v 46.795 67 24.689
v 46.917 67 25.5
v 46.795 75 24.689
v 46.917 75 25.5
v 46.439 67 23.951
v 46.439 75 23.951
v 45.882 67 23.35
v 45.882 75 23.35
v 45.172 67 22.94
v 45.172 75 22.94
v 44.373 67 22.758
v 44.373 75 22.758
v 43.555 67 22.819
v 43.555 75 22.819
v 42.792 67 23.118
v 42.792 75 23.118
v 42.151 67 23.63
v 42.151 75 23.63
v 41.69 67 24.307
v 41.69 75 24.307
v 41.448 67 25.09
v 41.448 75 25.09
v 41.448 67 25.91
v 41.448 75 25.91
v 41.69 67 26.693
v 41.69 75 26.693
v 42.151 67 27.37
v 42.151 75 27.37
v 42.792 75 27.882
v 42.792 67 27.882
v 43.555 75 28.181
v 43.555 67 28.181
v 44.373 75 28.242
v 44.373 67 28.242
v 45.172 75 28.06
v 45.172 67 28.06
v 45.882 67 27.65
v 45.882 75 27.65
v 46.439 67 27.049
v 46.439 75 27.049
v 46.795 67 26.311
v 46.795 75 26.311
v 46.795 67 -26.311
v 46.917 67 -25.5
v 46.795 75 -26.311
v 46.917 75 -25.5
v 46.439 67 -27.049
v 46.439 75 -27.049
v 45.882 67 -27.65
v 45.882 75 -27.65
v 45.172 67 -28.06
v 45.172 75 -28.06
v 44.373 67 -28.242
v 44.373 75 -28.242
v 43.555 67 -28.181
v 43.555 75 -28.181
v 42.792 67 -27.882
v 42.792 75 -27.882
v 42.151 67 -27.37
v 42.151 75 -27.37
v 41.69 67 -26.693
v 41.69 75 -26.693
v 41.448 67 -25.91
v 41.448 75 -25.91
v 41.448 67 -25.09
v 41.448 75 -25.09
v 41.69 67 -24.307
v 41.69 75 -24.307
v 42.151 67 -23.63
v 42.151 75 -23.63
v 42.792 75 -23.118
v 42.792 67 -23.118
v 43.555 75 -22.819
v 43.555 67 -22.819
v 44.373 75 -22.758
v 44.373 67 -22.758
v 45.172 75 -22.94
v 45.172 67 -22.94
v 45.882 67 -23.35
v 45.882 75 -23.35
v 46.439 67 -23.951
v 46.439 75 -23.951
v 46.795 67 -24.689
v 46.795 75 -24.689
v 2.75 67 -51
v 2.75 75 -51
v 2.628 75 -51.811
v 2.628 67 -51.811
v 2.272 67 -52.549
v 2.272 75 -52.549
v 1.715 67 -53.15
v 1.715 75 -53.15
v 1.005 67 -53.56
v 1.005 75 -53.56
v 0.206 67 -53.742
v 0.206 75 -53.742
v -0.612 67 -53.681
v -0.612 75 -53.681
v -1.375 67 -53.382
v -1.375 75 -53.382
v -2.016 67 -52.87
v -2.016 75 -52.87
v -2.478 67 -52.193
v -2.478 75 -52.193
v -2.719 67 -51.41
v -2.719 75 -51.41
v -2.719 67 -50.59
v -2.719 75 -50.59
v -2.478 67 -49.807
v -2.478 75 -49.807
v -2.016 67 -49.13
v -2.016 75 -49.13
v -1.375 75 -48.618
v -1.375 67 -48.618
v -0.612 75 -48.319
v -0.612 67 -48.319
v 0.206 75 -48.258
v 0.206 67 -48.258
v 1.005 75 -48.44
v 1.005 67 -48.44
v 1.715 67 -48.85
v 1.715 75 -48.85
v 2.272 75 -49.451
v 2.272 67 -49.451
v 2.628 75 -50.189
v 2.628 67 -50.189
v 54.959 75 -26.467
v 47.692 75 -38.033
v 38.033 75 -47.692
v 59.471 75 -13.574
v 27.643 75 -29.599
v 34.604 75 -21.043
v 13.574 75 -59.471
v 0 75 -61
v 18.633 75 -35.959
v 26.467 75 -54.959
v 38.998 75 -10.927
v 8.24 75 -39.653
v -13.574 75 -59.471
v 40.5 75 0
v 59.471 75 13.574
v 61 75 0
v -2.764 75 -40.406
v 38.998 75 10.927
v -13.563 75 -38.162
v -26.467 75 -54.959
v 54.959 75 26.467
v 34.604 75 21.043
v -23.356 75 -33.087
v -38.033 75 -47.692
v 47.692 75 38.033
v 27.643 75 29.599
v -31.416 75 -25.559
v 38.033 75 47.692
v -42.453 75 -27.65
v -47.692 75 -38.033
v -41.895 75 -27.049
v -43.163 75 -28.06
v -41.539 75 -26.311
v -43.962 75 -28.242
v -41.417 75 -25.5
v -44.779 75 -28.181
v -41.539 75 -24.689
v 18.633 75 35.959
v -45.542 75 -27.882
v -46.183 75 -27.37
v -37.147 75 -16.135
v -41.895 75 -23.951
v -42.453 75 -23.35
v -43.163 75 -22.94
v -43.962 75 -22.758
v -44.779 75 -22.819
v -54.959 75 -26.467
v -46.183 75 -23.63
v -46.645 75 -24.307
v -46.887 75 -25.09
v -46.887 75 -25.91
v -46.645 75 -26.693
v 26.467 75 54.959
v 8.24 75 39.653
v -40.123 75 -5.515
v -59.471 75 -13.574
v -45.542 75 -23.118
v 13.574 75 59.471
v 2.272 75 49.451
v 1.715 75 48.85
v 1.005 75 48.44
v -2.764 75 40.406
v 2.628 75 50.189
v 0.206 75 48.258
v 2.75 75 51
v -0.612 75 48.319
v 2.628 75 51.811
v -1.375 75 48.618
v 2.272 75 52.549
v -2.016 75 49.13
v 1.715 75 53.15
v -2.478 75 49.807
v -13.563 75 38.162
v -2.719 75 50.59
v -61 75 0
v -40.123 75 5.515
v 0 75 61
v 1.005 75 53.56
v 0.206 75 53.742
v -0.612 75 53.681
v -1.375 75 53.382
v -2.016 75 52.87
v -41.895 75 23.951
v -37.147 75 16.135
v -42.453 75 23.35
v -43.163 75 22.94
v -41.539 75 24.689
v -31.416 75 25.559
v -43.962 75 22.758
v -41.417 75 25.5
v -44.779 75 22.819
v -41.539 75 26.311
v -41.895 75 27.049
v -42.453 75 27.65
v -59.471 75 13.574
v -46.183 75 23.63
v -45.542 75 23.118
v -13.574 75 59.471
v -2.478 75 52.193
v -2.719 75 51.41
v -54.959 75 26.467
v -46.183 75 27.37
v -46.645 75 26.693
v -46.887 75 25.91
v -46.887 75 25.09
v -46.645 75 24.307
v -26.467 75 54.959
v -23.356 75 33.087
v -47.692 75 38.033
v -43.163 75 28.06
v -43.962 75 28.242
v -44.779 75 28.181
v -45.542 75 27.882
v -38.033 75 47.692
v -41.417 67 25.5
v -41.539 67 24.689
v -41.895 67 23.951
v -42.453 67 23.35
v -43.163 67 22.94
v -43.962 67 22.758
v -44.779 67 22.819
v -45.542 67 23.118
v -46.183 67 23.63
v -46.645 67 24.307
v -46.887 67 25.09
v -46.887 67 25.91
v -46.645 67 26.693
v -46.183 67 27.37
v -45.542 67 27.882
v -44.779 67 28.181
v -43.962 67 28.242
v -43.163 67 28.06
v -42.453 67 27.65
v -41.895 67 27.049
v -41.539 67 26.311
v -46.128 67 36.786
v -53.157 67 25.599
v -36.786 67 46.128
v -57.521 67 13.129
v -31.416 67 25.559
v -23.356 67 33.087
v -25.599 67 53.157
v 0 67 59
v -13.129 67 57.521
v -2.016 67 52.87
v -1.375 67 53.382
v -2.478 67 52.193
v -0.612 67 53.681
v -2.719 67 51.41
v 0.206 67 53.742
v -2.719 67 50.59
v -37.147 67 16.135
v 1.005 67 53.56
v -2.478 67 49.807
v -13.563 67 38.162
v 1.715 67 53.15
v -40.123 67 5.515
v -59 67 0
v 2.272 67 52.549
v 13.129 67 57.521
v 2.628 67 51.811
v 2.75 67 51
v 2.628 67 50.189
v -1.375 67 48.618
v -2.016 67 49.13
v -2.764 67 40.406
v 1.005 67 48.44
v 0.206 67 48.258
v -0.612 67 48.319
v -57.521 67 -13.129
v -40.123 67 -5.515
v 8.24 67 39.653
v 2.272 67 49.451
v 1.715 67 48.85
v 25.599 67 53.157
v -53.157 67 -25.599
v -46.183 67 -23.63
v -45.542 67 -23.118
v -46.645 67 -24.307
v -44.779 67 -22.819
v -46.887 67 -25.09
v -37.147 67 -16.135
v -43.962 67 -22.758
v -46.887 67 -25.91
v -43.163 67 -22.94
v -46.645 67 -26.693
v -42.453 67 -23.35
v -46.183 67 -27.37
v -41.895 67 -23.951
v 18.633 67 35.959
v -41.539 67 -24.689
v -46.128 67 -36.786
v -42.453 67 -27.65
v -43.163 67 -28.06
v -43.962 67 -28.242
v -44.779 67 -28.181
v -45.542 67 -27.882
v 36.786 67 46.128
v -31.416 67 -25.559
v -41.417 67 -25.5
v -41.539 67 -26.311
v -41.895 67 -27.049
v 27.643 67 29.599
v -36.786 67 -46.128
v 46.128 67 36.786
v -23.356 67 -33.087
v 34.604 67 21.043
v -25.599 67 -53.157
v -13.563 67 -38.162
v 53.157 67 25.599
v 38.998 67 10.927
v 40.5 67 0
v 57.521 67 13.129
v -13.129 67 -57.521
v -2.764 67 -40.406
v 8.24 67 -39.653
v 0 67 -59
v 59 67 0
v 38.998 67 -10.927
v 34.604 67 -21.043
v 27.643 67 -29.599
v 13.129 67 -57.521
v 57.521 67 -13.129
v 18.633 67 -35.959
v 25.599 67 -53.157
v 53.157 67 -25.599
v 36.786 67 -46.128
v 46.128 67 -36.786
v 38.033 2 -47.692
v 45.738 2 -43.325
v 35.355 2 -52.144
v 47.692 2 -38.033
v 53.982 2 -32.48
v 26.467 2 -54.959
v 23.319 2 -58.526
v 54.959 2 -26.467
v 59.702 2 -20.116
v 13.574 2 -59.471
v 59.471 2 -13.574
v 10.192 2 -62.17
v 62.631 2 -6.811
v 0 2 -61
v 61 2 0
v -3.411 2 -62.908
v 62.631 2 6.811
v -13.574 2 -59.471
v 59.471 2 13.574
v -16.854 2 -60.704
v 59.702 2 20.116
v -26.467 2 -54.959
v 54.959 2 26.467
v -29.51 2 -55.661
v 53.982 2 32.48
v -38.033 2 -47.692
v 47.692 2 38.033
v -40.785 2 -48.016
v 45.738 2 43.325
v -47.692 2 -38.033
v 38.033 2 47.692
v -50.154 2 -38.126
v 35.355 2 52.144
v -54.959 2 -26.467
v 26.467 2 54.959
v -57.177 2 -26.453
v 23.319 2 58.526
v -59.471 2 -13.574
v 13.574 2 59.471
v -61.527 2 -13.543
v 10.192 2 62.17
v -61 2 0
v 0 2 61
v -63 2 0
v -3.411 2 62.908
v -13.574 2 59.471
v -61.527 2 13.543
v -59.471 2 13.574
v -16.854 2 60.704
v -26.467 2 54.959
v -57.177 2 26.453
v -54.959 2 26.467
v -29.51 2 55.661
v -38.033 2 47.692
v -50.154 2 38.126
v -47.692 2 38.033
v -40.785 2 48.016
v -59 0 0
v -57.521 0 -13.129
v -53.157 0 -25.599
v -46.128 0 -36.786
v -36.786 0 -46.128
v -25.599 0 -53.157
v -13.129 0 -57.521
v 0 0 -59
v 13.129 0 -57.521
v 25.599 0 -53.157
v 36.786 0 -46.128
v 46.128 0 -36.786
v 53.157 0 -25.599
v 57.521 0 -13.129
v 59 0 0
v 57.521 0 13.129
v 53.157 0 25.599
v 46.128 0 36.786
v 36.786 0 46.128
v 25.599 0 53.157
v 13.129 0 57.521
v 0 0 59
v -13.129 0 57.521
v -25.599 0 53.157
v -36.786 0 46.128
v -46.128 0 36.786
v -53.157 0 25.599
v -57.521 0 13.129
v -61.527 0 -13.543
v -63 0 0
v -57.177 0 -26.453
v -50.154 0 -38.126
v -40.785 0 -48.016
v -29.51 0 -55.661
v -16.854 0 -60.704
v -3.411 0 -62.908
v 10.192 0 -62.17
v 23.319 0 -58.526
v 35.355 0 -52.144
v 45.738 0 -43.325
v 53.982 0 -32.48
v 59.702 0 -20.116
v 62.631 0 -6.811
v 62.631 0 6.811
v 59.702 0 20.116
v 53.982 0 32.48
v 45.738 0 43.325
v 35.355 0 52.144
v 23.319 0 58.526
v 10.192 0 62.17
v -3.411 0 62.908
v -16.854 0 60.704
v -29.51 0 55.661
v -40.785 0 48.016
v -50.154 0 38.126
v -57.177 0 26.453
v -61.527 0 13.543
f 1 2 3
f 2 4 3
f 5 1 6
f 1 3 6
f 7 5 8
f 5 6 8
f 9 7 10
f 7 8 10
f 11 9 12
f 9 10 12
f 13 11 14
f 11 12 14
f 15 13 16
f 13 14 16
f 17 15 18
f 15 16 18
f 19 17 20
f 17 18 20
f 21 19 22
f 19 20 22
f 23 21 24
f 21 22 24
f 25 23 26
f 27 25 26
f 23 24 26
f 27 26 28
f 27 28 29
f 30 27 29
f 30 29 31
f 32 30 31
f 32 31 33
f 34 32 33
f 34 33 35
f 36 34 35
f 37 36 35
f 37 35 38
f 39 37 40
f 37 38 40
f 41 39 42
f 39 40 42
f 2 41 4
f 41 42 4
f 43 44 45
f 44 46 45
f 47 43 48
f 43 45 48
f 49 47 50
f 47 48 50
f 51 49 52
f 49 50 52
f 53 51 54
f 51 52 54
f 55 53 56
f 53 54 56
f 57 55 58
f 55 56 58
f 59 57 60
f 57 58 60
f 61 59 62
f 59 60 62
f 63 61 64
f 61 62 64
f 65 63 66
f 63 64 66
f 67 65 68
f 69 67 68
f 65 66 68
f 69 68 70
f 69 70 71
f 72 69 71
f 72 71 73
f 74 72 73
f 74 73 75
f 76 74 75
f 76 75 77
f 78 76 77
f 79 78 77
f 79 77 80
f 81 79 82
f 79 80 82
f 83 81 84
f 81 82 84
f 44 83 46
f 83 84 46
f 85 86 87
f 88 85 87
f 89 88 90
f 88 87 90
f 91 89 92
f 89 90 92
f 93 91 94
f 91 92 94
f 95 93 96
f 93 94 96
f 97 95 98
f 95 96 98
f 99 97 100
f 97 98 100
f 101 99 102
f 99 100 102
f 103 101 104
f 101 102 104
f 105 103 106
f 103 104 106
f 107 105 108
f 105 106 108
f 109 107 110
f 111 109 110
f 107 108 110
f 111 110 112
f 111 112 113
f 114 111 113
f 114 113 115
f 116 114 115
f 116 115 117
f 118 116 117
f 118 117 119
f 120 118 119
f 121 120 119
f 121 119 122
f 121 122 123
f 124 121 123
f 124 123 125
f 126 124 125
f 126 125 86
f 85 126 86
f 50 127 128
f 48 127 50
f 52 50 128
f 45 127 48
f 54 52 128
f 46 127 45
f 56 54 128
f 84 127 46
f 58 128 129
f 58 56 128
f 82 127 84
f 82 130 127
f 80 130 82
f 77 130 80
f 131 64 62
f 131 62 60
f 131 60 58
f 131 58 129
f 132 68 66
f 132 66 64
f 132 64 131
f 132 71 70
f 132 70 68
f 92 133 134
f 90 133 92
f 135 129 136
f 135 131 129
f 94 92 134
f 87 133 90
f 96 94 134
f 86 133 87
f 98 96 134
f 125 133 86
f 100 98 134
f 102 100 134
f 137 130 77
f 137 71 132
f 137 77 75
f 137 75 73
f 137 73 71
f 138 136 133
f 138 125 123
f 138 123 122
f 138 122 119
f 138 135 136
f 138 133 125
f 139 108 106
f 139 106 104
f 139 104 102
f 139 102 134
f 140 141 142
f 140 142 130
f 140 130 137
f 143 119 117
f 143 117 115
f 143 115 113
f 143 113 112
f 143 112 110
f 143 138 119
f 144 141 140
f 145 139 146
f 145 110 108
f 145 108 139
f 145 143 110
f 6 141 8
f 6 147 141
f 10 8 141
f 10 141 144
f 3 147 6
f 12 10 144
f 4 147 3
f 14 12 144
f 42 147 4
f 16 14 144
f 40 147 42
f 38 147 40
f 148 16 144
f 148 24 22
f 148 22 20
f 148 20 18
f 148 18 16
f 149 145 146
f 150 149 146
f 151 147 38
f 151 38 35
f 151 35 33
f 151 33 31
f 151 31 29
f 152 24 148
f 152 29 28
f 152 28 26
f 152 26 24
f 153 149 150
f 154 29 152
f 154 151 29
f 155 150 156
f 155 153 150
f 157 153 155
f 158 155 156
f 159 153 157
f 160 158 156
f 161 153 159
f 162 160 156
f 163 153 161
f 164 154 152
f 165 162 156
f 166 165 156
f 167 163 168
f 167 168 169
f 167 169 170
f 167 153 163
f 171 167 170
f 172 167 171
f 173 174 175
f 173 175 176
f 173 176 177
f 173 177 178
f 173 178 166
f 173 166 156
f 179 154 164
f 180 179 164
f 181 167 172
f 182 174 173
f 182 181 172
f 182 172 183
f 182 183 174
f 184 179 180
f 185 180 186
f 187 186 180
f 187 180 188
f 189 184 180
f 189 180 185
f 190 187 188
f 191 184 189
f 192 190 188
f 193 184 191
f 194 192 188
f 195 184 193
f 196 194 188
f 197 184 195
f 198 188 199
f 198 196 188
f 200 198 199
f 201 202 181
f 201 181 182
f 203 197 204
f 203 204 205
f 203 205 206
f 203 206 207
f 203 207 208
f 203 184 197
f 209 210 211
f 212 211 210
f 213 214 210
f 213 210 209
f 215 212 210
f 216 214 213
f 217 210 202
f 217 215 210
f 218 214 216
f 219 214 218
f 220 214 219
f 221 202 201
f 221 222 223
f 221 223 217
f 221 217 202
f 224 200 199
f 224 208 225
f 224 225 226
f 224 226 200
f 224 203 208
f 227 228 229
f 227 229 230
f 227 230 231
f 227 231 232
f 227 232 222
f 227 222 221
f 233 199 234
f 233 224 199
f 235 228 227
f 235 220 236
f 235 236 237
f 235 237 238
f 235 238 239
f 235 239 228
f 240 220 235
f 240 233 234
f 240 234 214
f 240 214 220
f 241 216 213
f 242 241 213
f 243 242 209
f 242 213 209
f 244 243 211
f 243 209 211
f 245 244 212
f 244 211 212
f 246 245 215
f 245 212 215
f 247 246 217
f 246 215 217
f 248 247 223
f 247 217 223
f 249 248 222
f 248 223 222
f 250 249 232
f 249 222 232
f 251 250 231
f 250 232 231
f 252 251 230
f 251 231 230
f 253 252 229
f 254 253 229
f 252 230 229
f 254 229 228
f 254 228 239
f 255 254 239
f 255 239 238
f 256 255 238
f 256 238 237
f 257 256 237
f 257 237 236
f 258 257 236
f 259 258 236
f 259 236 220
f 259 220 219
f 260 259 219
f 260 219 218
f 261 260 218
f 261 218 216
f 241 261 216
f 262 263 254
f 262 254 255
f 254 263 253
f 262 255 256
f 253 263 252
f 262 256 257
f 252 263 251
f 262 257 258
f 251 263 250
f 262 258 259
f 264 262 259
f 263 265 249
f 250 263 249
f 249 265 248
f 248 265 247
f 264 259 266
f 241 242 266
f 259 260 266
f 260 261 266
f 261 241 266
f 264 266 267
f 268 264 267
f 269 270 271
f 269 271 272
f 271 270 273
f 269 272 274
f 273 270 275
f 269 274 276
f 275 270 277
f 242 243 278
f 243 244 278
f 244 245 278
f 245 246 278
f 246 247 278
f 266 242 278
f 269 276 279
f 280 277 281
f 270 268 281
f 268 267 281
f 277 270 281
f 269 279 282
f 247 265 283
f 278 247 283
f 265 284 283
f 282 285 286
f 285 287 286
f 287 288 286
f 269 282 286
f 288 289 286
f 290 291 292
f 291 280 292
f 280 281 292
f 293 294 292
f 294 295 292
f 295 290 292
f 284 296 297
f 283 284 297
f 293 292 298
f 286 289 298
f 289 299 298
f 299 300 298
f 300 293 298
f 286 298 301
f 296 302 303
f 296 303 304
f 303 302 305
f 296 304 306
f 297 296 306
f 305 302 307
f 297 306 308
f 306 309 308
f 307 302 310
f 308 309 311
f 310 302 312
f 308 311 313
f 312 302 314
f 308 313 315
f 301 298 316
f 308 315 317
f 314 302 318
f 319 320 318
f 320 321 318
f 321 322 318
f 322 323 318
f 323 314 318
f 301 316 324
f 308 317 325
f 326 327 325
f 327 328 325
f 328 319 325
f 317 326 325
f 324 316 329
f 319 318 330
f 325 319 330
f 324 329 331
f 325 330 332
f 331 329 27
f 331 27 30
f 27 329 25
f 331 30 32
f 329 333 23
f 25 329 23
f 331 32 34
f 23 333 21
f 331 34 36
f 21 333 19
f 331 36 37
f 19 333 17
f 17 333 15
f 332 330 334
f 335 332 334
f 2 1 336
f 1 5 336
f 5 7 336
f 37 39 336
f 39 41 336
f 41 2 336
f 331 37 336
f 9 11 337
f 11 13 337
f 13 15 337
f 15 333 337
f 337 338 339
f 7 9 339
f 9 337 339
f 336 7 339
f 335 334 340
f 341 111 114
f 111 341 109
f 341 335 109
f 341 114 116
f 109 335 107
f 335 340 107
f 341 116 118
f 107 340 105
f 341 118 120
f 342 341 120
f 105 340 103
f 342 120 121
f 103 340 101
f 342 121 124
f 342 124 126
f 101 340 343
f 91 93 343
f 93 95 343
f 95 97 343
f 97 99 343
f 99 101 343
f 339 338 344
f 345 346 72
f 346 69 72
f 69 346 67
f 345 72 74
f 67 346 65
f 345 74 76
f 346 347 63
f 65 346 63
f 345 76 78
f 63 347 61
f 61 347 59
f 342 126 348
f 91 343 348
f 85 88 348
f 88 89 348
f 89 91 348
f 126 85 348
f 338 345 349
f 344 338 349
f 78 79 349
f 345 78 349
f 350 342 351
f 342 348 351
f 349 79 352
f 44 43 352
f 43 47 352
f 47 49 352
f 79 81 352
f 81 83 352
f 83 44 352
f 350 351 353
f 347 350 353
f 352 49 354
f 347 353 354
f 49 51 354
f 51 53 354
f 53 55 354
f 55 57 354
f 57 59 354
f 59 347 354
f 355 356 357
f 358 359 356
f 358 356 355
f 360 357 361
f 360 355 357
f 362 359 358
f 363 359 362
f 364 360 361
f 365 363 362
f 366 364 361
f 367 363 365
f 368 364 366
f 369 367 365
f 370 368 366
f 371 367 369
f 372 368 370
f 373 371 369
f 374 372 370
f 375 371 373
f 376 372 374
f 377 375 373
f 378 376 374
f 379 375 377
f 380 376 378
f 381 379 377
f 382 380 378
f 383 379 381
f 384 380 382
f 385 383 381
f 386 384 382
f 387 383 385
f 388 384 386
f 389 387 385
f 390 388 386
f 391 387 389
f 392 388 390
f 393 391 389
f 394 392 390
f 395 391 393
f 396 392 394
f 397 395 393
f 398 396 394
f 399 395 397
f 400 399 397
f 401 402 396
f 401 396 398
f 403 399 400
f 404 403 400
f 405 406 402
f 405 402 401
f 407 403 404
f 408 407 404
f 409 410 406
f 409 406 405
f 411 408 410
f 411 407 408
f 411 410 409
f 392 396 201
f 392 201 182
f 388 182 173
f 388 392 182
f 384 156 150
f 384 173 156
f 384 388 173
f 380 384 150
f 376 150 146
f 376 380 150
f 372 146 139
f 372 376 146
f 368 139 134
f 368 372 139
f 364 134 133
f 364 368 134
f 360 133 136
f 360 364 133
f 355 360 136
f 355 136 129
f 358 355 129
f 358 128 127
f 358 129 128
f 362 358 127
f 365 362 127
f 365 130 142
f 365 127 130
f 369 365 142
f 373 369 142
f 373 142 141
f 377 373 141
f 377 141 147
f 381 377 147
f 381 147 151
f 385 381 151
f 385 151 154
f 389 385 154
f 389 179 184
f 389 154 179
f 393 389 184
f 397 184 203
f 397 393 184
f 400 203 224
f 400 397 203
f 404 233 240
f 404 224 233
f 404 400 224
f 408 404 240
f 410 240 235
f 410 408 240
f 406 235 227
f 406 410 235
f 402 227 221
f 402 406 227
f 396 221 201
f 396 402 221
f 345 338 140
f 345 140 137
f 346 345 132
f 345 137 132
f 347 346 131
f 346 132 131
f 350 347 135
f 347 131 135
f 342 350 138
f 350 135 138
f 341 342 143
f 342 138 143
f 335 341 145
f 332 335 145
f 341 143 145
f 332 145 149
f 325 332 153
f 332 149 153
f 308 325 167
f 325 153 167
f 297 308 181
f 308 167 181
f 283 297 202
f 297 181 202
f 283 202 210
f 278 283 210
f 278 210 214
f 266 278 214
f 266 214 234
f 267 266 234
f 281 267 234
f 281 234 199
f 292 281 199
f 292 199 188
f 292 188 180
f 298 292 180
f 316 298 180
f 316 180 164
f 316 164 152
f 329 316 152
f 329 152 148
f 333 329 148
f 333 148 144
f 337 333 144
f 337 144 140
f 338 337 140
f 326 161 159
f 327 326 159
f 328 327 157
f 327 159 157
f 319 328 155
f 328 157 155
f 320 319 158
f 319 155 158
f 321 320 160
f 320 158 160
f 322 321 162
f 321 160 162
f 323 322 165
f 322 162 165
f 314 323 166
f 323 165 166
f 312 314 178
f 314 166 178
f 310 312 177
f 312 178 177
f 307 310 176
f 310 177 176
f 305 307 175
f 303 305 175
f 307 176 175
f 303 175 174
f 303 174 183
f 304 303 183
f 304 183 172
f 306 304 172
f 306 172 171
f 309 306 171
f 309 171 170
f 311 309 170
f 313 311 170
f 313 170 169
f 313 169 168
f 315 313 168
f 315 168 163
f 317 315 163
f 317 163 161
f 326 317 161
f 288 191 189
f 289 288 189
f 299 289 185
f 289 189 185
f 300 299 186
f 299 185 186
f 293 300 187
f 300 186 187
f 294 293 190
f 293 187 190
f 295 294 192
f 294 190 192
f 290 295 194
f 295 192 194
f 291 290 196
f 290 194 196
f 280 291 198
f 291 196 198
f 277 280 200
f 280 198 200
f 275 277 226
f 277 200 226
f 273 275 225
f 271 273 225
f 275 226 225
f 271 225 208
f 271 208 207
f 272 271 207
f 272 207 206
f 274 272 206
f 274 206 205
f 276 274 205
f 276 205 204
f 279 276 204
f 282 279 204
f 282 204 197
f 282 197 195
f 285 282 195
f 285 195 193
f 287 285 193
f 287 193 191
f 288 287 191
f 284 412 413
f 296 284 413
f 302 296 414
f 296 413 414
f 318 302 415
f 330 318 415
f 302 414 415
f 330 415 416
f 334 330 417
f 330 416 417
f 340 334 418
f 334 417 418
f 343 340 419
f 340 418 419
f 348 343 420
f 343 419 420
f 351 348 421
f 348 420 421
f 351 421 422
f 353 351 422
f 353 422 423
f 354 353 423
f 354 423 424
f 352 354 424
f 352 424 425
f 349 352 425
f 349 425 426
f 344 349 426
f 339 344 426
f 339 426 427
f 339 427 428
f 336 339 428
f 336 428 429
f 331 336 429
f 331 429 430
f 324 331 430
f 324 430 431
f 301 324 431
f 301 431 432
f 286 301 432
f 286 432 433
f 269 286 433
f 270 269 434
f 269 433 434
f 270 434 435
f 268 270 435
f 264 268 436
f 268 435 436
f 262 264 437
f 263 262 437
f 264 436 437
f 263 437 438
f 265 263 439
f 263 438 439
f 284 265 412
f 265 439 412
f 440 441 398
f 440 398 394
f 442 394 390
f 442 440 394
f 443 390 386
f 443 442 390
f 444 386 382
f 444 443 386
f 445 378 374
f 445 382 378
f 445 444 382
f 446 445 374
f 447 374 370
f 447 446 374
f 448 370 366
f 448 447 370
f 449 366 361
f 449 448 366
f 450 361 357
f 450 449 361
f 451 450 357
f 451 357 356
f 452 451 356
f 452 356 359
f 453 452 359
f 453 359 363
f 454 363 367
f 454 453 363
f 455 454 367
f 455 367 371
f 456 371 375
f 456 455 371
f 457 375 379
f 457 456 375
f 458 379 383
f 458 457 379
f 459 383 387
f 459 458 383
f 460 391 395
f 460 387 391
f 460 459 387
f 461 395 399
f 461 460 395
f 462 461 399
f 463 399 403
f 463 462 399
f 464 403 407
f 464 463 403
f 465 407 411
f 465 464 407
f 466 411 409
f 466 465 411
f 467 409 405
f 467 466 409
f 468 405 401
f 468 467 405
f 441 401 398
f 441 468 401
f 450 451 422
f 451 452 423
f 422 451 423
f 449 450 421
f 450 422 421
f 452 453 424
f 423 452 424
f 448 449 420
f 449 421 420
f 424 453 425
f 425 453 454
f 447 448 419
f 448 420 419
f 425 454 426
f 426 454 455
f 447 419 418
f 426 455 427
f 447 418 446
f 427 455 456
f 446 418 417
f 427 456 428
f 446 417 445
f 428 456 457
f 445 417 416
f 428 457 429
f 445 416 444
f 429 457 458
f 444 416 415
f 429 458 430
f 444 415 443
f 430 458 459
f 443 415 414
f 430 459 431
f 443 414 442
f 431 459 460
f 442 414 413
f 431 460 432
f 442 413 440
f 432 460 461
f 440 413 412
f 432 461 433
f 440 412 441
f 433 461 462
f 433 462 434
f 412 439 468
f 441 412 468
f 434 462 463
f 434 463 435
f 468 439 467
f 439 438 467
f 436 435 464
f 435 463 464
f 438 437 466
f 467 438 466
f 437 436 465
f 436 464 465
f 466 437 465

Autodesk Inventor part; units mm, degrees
ref_plane "YZ Plane" through (0, 0, 0) normal (1, 0, 0) x (0, 1, 0)
ref_plane "XZ Plane" through (0, 0, 0) normal (0, 1, 0) x (-1, 0, 0)
sketch "Sketch1" plane through (0, 0, 0) normal (0, 1, 0) x (-1, 0, 0)
  circle A0 centre (0, 0) radius 63
  circle A1 centre (0, 0) radius 61
  circle A2 centre (0, 0) radius 59
  dimension "Absolute_Diameter" = 126
  dimension "Diameter_No_Outer_Lip" = 122
  dimension "Inner_Cylinder_Diameter" = 118
extrude "Extrusion1" add sketch "Sketch1" along normal blind 2 contours A0
extrude "Extrusion2" add sketch "Sketch1" along normal blind 75 contours A1
sketch "Sketch2" plane through (0, 75, 0) normal (0, 1, 0) x (1, 0, 0)
  circle A0 centre (0, 0) radius 40.5
  circle A1 centre (0, 0) radius 61
  dimension "Lip_Diameter_Out" = 81
  dimension "Top_Outer_Lip_Diameter" = 122
extrude "Extrusion7" add sketch "Sketch2" against normal blind 8
ref_plane "Work Plane2" through (0, 10, 0) normal (0, 1, 0) x (1, 0, 0)
sketch "Sketch3" plane through (0, 10, 0) normal (0, 1, 0) x (1, 0, 0)
  circle A0 centre (0, 0) radius 127.5
  circle A1 centre (-127.5, 0) radius 2.5
  circle A2 centre (-103.1497, -74.9426) radius 2.5
  circle A3 centre (-39.3997, -121.2597) radius 2.5
  circle A4 centre (39.3997, -121.2597) radius 2.5
  circle A5 centre (103.1497, -74.9426) radius 2.5
  circle A6 centre (127.5, 0) radius 2.5
  circle A7 centre (103.1497, 74.9426) radius 2.5
  circle A8 centre (39.3997, 121.2597) radius 2.5
  circle A9 centre (-39.3997, 121.2597) radius 2.5
  circle A10 centre (-103.1497, 74.9426) radius 2.5
  dimension "d27" = 255
  dimension "d28" = 5
  dimension "d31" = 360
extrude "Extrusion8" [suppressed]
sketch "Sketch24" plane through (0, 75, 0) normal (0, 1, 0) x (1, 0, 0)
  circle A0 centre (0, 0) radius 51
  circle A1 centre (0, -51) radius 2.75
  circle A2 centre (44.1673, -25.5) radius 2.75
  circle A3 centre (44.1673, 25.5) radius 2.75
  circle A4 centre (0, 51) radius 2.75
  circle A5 centre (-44.1673, 25.5) radius 2.75
  circle A6 centre (-44.1673, -25.5) radius 2.75
  dimension "d230" = 102
  dimension "d231" = 5.5
  dimension "d234" = 360
extrude "Extrusion30" cut sketch "Sketch24" against normal blind 10 contours A3 A0 | A0 A3 | A2 A0 | A0 A2 | A4 A0 | A0 A4 | A1 A0 | A0 A1 | A5 A0 | A0 A5 | A6 A0 | A0 A6
sketch "Sketch48" plane through (0, 75, 0) normal (0, 1, 0) x (1, 0, 0)
  circle A0 centre (0, 0) radius 51
  dimension "Lip_Height" = 2
  dimension "d897" = 102
properties part number "Cylinder Replacement- 11"
